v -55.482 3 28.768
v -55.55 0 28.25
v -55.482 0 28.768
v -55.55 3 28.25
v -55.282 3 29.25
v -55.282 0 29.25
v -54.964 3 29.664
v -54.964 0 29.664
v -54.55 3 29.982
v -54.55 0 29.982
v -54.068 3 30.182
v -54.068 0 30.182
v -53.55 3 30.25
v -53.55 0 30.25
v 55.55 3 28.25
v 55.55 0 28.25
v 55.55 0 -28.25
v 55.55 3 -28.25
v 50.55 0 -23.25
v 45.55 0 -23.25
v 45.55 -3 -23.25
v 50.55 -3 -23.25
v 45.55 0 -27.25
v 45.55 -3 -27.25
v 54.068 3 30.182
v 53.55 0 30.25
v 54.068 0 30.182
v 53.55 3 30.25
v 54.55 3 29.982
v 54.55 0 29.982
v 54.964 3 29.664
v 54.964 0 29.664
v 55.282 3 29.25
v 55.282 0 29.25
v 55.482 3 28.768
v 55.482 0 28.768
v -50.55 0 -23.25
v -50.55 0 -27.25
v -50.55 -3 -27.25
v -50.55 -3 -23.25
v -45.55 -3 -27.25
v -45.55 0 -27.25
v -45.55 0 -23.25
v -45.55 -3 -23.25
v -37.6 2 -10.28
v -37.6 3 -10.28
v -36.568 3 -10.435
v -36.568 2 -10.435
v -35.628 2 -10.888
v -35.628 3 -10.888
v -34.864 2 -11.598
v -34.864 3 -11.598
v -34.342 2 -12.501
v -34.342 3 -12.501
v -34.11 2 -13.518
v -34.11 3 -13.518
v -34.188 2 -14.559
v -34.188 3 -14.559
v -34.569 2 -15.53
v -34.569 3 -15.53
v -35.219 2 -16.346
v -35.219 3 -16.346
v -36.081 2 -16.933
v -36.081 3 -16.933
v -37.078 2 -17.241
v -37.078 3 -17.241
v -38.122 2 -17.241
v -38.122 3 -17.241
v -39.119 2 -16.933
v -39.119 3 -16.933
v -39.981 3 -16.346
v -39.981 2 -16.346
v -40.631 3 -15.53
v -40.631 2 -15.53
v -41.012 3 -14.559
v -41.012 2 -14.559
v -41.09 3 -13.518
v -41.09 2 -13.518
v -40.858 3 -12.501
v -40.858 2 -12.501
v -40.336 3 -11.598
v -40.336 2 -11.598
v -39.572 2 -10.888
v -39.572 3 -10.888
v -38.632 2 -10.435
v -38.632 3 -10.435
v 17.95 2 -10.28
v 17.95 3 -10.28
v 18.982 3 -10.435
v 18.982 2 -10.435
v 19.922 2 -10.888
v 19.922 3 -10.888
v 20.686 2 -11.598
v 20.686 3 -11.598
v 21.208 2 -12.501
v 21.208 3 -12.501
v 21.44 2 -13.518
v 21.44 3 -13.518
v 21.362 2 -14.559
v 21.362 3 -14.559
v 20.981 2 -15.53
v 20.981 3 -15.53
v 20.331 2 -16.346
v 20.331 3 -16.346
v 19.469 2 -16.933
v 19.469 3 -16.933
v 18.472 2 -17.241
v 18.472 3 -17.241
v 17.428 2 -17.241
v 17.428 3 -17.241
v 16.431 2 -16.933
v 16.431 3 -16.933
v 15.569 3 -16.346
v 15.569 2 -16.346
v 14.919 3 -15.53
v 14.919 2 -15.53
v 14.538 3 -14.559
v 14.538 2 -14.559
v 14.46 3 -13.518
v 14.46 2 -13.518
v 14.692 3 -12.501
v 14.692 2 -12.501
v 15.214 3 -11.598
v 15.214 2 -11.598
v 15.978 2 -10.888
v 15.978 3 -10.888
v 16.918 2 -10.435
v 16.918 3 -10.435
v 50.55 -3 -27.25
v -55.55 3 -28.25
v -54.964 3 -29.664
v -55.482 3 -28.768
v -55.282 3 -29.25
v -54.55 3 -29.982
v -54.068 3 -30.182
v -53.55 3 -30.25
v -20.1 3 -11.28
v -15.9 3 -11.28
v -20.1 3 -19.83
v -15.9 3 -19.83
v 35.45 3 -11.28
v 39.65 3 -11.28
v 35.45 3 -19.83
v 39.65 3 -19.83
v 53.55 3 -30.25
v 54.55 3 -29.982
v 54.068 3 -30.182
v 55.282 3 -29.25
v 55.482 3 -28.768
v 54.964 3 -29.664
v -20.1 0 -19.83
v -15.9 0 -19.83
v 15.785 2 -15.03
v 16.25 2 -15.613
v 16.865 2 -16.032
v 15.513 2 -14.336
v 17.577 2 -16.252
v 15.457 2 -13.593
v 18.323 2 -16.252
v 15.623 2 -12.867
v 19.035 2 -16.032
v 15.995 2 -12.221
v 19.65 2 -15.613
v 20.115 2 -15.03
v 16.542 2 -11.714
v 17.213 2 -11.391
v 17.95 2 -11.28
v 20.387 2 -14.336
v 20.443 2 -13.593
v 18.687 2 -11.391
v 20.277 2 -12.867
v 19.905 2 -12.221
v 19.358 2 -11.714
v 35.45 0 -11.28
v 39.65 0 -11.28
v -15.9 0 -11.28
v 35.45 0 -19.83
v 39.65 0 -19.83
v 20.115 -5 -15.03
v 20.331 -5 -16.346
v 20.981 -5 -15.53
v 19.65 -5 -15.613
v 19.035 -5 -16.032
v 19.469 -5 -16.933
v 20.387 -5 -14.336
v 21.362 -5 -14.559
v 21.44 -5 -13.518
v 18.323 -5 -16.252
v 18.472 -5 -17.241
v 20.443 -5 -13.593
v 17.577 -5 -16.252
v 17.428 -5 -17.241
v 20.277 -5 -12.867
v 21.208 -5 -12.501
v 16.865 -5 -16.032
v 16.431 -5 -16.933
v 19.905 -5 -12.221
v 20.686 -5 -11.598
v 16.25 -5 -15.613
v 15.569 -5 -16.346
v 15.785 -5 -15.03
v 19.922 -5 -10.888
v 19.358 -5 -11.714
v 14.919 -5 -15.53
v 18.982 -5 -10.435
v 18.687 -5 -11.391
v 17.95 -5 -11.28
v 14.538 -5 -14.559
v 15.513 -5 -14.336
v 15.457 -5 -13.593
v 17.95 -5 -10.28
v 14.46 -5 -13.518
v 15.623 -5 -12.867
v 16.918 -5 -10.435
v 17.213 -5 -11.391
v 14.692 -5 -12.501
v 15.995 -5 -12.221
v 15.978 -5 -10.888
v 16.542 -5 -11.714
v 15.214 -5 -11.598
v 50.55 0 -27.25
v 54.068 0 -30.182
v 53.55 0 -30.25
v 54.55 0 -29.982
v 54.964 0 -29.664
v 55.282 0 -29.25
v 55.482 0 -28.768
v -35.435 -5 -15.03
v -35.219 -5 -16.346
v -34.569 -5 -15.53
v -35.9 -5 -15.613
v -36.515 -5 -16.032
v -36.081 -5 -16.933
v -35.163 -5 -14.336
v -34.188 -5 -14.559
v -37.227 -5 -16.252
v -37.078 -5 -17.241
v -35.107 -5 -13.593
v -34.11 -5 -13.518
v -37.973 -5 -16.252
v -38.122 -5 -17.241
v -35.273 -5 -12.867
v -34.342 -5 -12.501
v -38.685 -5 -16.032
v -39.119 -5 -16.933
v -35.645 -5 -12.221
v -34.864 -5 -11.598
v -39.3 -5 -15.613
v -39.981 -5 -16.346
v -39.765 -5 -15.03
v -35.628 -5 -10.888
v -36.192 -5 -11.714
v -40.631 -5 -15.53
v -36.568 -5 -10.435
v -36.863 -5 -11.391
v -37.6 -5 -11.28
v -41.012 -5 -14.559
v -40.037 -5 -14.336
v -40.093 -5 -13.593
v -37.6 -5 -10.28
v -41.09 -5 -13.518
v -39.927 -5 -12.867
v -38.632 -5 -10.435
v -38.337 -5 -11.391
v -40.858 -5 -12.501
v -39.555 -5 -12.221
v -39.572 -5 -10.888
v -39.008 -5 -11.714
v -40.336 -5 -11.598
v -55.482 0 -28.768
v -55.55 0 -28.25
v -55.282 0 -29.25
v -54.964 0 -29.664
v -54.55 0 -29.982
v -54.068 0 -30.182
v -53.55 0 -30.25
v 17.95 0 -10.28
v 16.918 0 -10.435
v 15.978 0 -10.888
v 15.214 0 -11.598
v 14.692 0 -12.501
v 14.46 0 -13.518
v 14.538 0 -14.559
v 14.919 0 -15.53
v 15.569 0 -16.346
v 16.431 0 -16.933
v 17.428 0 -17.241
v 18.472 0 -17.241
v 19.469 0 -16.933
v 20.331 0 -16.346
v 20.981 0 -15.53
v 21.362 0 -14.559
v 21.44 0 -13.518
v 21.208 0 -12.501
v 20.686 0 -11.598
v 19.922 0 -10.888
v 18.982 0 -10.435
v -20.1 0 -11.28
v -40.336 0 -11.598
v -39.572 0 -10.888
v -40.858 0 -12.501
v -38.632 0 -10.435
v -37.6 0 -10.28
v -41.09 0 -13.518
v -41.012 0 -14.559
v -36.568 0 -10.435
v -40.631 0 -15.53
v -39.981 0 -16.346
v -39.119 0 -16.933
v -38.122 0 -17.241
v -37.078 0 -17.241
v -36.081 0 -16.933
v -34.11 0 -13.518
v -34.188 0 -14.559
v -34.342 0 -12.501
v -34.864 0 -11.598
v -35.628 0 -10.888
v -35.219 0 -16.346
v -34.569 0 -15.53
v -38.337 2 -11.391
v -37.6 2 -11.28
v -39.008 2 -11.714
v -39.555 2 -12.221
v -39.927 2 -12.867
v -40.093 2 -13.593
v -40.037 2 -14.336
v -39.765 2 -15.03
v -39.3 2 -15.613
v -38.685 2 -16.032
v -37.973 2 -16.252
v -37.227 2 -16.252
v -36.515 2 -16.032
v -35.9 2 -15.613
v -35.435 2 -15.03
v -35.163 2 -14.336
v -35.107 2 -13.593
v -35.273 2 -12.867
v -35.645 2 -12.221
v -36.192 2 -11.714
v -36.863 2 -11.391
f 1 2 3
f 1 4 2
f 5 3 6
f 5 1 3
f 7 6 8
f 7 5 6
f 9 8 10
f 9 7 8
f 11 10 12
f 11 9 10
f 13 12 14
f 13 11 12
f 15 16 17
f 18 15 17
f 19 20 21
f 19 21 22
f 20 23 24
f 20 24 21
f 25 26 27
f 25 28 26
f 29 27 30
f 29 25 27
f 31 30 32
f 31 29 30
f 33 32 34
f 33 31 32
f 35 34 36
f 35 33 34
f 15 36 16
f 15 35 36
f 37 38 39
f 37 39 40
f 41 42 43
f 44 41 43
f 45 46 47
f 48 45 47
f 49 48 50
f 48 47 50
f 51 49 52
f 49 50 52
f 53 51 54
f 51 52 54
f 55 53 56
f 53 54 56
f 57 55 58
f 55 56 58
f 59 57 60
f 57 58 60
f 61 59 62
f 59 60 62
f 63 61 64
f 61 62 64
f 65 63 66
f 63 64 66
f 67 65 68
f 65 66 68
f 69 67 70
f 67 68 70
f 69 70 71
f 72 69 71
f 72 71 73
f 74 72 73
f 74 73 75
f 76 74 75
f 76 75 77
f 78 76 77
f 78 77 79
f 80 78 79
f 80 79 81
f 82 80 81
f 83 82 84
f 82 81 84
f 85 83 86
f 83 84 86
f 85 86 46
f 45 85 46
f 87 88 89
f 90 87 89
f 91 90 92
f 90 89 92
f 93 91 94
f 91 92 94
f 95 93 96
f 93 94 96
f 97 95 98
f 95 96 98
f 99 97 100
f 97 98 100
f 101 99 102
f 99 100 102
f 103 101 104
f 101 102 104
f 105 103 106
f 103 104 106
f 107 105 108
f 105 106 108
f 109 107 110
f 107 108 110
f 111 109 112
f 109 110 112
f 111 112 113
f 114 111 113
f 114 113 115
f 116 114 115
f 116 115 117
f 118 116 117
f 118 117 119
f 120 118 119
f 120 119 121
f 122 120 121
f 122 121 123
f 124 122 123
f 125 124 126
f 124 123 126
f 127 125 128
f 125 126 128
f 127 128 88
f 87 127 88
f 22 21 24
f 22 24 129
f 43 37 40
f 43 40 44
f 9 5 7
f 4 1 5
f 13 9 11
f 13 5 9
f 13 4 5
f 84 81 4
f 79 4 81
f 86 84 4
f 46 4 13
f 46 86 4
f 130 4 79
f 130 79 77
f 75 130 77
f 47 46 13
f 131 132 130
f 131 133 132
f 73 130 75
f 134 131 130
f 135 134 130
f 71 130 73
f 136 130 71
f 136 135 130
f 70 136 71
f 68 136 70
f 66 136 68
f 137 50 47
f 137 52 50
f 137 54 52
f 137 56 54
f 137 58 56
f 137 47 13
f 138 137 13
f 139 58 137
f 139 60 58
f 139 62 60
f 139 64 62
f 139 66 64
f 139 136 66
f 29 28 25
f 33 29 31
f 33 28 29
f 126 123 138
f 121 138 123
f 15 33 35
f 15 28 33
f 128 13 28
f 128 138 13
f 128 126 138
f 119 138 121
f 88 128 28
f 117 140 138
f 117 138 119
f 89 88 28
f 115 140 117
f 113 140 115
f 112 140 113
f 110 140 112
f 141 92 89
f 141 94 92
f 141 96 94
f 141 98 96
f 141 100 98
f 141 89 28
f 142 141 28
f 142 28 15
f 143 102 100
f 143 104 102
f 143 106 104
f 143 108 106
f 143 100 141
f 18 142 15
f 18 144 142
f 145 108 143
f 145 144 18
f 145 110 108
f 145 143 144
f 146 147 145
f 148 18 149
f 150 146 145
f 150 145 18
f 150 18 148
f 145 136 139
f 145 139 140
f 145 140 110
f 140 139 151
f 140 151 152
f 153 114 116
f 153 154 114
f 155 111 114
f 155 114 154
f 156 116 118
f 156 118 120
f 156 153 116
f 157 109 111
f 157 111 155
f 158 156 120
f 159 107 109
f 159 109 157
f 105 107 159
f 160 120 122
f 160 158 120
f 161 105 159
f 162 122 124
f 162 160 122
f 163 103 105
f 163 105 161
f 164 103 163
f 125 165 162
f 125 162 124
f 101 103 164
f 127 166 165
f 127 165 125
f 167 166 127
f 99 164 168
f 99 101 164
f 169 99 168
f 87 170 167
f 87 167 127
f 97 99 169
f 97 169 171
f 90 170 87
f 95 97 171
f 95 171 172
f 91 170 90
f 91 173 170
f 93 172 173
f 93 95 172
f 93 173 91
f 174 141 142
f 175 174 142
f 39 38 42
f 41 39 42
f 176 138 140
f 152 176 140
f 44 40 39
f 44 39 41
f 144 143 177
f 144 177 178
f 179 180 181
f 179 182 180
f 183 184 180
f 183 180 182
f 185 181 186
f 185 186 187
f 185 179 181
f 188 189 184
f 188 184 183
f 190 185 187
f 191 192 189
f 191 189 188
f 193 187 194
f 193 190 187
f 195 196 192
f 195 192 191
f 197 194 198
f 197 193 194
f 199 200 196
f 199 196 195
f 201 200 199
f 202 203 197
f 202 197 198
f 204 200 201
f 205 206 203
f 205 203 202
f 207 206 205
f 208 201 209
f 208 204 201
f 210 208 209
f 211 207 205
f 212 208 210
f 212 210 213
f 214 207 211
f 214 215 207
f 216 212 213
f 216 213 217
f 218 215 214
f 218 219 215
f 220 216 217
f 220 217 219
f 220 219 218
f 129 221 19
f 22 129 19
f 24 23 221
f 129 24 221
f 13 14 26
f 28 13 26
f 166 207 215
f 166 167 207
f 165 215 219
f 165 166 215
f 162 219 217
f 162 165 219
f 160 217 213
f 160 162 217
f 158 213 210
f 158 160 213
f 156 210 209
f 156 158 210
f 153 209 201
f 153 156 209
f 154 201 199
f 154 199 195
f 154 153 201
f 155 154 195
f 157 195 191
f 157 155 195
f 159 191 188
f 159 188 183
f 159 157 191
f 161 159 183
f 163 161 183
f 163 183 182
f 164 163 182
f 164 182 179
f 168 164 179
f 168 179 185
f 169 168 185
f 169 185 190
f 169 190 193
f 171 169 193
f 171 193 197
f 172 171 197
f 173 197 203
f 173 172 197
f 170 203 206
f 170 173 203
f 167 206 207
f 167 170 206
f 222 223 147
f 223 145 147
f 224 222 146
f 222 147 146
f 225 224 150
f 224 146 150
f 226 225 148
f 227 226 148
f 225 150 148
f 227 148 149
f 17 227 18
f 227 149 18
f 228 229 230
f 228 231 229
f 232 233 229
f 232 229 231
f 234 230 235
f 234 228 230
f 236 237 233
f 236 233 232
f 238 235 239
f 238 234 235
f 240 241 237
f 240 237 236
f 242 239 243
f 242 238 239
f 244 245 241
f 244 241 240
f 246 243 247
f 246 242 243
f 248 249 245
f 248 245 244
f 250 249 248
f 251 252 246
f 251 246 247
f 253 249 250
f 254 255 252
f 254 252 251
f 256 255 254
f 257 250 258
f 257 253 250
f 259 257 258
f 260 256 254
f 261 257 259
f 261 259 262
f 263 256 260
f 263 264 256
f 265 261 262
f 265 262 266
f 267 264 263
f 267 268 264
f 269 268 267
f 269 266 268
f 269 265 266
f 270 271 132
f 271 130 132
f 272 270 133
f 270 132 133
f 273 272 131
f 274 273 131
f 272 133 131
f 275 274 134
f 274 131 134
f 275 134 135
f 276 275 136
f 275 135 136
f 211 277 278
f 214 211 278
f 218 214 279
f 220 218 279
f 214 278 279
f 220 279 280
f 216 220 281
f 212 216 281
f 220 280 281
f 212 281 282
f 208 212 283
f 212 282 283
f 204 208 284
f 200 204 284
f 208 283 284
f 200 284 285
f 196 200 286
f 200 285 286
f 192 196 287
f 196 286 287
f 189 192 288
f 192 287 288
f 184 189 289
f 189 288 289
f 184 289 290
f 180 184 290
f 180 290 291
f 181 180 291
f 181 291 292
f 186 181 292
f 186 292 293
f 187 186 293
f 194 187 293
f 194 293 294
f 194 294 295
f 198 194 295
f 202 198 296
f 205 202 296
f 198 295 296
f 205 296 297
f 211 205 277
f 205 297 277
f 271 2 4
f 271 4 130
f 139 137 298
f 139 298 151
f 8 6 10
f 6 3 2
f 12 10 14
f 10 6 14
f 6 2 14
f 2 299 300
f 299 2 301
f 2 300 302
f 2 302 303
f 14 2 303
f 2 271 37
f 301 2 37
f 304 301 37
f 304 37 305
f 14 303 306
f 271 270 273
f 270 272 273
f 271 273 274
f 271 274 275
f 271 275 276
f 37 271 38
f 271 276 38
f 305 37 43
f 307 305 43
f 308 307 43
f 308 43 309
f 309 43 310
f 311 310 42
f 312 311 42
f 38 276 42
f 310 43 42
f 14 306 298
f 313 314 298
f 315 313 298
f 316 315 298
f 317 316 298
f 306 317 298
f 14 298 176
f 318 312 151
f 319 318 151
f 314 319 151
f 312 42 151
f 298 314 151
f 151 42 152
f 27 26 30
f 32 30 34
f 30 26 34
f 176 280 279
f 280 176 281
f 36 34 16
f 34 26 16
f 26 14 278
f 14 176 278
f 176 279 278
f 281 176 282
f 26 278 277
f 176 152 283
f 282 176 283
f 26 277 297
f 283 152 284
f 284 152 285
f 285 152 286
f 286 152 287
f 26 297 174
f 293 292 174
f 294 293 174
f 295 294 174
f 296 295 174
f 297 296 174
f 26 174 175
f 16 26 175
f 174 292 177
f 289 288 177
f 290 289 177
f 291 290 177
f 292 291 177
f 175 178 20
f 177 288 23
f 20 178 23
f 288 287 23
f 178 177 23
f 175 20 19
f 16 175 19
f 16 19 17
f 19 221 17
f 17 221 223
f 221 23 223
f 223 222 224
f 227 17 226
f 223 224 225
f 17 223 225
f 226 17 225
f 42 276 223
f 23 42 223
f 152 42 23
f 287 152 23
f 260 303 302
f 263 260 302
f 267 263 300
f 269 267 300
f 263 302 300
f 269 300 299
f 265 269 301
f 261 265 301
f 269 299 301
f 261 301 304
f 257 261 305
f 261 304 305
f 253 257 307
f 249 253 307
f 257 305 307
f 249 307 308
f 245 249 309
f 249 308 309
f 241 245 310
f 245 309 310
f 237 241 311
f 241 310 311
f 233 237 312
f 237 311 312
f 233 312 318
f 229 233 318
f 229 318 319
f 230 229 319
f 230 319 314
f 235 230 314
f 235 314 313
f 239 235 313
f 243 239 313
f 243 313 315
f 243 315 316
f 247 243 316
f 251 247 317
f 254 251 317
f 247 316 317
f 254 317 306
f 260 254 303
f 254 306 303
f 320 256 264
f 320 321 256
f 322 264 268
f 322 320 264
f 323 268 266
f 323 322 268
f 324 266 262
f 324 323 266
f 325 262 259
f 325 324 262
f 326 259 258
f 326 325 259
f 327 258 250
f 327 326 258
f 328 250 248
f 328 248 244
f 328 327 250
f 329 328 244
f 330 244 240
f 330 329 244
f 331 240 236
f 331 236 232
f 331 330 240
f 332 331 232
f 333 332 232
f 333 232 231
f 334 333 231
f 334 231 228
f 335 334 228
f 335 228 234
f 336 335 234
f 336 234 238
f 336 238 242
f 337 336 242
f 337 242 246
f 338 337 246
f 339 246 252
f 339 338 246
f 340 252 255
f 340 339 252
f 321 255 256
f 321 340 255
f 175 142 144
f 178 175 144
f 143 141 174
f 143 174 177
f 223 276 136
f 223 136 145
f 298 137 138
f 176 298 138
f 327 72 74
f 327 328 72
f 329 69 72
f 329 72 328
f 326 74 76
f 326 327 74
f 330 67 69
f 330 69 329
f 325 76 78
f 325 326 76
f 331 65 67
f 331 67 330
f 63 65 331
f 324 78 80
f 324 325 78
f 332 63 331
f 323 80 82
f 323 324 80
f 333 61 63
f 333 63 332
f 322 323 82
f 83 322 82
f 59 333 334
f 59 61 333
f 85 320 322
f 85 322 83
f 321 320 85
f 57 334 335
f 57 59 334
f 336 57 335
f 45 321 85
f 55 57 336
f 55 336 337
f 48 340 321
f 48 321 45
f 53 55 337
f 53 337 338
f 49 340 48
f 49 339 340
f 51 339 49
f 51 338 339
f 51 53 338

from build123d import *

# Parameters (mm, degrees)
SKETCH1_W           = 111.1
SKETCH1_H           = 60.5
BOSS_EXTRUDE1_DEPTH = 3
SKETCH9_W           = 5
SKETCH9_H           = 4
BOSS_EXTRUDE5_DEPTH = 3
FILLET1_R           = 2
SKETCH10_R          = 2.5
SKETCH10_W          = 4.2
SKETCH10_H          = 8.55
CUT_EXTRUDE1_DEPTH  = 10
SKETCH11_R          = 3.5
CUT_EXTRUDE2_DEPTH  = 1
SKETCH12_R          = 3.5
SKETCH12_R_2        = 2.5
BOSS_EXTRUDE6_DEPTH = 5


with BuildPart() as part:
    # Sketch1 → Boss-Extrude1 (new body)
    with BuildSketch(Plane(origin=(0, 0, 0), x_dir=(1, 0, 0), z_dir=(0, 1, 0))):
        Rectangle(SKETCH1_W, SKETCH1_H)
    extrude(amount=BOSS_EXTRUDE1_DEPTH)

    # Sketch9 → Boss-Extrude5 (add)
    with BuildSketch(Plane.XZ):
        with Locations((-48.05, -25.25)):
            Rectangle(SKETCH9_W, SKETCH9_H)
        with Locations((48.05, -25.25)):
            Rectangle(SKETCH9_W, SKETCH9_H)
    extrude(amount=BOSS_EXTRUDE5_DEPTH)

    # Fillet1
    fillet1_edges = [part.edges().sort_by_distance(p)[0] for p in [
        (-55.55, 1.5, -30.25),
        (55.55, 1.5, -30.25),
        (55.55, 1.5, 30.25),
        (-55.55, 1.5, 30.25),
    ]]
    fillet(fillet1_edges, radius=FILLET1_R)

    # Sketch10 → Cut-Extrude1 (cut)
    with BuildSketch(Plane(origin=(0, 3, 0), x_dir=(1, 0, 0), z_dir=(0, 1, 0))):
        with Locations(Location((-37.6, 13.78, 0), (0, 0, 270))):
            Circle(SKETCH10_R)
        with Locations(Location((17.95, 13.78, 0), (0, 0, 270))):
            Circle(SKETCH10_R)
        with Locations((37.55, 15.555)):
            Rectangle(SKETCH10_W, SKETCH10_H)
        with Locations((-18, 15.555)):
            Rectangle(SKETCH10_W, SKETCH10_H)
    extrude(amount=-CUT_EXTRUDE1_DEPTH, mode=Mode.SUBTRACT)

    # Sketch11 → Cut-Extrude2 (cut)
    with BuildSketch(Plane(origin=(0, 3, 0), x_dir=(1, 0, 0), z_dir=(0, 1, 0))):
        with Locations(Location((-37.6, 13.78, 0), (0, 0, 270))):
            Circle(SKETCH11_R)
        with Locations(Location((17.95, 13.78, 0), (0, 0, 270))):
            Circle(SKETCH11_R)
    extrude(amount=-CUT_EXTRUDE2_DEPTH, mode=Mode.SUBTRACT)

    # Sketch12 → Boss-Extrude6 (add)
    # profile 1 of 2: a face of its own
    with BuildSketch(Plane.XZ):
        with Locations(Location((17.95, -13.78, 0), (0, 0, 90))):
            Circle(SKETCH12_R)
        with Locations(Location((17.95, -13.78, 0), (0, 0, 90))):
            Circle(SKETCH12_R_2, mode=Mode.SUBTRACT)
    # profile 2 of 2: a face of its own
    with BuildSketch(Plane.XZ):
        with Locations(Location((-37.6, -13.78, 0), (0, 0, 90))):
            Circle(SKETCH12_R)
        with Locations(Location((-37.6, -13.78, 0), (0, 0, 90))):
            Circle(SKETCH12_R_2, mode=Mode.SUBTRACT)
    extrude(amount=BOSS_EXTRUDE6_DEPTH)


solid = part.part
